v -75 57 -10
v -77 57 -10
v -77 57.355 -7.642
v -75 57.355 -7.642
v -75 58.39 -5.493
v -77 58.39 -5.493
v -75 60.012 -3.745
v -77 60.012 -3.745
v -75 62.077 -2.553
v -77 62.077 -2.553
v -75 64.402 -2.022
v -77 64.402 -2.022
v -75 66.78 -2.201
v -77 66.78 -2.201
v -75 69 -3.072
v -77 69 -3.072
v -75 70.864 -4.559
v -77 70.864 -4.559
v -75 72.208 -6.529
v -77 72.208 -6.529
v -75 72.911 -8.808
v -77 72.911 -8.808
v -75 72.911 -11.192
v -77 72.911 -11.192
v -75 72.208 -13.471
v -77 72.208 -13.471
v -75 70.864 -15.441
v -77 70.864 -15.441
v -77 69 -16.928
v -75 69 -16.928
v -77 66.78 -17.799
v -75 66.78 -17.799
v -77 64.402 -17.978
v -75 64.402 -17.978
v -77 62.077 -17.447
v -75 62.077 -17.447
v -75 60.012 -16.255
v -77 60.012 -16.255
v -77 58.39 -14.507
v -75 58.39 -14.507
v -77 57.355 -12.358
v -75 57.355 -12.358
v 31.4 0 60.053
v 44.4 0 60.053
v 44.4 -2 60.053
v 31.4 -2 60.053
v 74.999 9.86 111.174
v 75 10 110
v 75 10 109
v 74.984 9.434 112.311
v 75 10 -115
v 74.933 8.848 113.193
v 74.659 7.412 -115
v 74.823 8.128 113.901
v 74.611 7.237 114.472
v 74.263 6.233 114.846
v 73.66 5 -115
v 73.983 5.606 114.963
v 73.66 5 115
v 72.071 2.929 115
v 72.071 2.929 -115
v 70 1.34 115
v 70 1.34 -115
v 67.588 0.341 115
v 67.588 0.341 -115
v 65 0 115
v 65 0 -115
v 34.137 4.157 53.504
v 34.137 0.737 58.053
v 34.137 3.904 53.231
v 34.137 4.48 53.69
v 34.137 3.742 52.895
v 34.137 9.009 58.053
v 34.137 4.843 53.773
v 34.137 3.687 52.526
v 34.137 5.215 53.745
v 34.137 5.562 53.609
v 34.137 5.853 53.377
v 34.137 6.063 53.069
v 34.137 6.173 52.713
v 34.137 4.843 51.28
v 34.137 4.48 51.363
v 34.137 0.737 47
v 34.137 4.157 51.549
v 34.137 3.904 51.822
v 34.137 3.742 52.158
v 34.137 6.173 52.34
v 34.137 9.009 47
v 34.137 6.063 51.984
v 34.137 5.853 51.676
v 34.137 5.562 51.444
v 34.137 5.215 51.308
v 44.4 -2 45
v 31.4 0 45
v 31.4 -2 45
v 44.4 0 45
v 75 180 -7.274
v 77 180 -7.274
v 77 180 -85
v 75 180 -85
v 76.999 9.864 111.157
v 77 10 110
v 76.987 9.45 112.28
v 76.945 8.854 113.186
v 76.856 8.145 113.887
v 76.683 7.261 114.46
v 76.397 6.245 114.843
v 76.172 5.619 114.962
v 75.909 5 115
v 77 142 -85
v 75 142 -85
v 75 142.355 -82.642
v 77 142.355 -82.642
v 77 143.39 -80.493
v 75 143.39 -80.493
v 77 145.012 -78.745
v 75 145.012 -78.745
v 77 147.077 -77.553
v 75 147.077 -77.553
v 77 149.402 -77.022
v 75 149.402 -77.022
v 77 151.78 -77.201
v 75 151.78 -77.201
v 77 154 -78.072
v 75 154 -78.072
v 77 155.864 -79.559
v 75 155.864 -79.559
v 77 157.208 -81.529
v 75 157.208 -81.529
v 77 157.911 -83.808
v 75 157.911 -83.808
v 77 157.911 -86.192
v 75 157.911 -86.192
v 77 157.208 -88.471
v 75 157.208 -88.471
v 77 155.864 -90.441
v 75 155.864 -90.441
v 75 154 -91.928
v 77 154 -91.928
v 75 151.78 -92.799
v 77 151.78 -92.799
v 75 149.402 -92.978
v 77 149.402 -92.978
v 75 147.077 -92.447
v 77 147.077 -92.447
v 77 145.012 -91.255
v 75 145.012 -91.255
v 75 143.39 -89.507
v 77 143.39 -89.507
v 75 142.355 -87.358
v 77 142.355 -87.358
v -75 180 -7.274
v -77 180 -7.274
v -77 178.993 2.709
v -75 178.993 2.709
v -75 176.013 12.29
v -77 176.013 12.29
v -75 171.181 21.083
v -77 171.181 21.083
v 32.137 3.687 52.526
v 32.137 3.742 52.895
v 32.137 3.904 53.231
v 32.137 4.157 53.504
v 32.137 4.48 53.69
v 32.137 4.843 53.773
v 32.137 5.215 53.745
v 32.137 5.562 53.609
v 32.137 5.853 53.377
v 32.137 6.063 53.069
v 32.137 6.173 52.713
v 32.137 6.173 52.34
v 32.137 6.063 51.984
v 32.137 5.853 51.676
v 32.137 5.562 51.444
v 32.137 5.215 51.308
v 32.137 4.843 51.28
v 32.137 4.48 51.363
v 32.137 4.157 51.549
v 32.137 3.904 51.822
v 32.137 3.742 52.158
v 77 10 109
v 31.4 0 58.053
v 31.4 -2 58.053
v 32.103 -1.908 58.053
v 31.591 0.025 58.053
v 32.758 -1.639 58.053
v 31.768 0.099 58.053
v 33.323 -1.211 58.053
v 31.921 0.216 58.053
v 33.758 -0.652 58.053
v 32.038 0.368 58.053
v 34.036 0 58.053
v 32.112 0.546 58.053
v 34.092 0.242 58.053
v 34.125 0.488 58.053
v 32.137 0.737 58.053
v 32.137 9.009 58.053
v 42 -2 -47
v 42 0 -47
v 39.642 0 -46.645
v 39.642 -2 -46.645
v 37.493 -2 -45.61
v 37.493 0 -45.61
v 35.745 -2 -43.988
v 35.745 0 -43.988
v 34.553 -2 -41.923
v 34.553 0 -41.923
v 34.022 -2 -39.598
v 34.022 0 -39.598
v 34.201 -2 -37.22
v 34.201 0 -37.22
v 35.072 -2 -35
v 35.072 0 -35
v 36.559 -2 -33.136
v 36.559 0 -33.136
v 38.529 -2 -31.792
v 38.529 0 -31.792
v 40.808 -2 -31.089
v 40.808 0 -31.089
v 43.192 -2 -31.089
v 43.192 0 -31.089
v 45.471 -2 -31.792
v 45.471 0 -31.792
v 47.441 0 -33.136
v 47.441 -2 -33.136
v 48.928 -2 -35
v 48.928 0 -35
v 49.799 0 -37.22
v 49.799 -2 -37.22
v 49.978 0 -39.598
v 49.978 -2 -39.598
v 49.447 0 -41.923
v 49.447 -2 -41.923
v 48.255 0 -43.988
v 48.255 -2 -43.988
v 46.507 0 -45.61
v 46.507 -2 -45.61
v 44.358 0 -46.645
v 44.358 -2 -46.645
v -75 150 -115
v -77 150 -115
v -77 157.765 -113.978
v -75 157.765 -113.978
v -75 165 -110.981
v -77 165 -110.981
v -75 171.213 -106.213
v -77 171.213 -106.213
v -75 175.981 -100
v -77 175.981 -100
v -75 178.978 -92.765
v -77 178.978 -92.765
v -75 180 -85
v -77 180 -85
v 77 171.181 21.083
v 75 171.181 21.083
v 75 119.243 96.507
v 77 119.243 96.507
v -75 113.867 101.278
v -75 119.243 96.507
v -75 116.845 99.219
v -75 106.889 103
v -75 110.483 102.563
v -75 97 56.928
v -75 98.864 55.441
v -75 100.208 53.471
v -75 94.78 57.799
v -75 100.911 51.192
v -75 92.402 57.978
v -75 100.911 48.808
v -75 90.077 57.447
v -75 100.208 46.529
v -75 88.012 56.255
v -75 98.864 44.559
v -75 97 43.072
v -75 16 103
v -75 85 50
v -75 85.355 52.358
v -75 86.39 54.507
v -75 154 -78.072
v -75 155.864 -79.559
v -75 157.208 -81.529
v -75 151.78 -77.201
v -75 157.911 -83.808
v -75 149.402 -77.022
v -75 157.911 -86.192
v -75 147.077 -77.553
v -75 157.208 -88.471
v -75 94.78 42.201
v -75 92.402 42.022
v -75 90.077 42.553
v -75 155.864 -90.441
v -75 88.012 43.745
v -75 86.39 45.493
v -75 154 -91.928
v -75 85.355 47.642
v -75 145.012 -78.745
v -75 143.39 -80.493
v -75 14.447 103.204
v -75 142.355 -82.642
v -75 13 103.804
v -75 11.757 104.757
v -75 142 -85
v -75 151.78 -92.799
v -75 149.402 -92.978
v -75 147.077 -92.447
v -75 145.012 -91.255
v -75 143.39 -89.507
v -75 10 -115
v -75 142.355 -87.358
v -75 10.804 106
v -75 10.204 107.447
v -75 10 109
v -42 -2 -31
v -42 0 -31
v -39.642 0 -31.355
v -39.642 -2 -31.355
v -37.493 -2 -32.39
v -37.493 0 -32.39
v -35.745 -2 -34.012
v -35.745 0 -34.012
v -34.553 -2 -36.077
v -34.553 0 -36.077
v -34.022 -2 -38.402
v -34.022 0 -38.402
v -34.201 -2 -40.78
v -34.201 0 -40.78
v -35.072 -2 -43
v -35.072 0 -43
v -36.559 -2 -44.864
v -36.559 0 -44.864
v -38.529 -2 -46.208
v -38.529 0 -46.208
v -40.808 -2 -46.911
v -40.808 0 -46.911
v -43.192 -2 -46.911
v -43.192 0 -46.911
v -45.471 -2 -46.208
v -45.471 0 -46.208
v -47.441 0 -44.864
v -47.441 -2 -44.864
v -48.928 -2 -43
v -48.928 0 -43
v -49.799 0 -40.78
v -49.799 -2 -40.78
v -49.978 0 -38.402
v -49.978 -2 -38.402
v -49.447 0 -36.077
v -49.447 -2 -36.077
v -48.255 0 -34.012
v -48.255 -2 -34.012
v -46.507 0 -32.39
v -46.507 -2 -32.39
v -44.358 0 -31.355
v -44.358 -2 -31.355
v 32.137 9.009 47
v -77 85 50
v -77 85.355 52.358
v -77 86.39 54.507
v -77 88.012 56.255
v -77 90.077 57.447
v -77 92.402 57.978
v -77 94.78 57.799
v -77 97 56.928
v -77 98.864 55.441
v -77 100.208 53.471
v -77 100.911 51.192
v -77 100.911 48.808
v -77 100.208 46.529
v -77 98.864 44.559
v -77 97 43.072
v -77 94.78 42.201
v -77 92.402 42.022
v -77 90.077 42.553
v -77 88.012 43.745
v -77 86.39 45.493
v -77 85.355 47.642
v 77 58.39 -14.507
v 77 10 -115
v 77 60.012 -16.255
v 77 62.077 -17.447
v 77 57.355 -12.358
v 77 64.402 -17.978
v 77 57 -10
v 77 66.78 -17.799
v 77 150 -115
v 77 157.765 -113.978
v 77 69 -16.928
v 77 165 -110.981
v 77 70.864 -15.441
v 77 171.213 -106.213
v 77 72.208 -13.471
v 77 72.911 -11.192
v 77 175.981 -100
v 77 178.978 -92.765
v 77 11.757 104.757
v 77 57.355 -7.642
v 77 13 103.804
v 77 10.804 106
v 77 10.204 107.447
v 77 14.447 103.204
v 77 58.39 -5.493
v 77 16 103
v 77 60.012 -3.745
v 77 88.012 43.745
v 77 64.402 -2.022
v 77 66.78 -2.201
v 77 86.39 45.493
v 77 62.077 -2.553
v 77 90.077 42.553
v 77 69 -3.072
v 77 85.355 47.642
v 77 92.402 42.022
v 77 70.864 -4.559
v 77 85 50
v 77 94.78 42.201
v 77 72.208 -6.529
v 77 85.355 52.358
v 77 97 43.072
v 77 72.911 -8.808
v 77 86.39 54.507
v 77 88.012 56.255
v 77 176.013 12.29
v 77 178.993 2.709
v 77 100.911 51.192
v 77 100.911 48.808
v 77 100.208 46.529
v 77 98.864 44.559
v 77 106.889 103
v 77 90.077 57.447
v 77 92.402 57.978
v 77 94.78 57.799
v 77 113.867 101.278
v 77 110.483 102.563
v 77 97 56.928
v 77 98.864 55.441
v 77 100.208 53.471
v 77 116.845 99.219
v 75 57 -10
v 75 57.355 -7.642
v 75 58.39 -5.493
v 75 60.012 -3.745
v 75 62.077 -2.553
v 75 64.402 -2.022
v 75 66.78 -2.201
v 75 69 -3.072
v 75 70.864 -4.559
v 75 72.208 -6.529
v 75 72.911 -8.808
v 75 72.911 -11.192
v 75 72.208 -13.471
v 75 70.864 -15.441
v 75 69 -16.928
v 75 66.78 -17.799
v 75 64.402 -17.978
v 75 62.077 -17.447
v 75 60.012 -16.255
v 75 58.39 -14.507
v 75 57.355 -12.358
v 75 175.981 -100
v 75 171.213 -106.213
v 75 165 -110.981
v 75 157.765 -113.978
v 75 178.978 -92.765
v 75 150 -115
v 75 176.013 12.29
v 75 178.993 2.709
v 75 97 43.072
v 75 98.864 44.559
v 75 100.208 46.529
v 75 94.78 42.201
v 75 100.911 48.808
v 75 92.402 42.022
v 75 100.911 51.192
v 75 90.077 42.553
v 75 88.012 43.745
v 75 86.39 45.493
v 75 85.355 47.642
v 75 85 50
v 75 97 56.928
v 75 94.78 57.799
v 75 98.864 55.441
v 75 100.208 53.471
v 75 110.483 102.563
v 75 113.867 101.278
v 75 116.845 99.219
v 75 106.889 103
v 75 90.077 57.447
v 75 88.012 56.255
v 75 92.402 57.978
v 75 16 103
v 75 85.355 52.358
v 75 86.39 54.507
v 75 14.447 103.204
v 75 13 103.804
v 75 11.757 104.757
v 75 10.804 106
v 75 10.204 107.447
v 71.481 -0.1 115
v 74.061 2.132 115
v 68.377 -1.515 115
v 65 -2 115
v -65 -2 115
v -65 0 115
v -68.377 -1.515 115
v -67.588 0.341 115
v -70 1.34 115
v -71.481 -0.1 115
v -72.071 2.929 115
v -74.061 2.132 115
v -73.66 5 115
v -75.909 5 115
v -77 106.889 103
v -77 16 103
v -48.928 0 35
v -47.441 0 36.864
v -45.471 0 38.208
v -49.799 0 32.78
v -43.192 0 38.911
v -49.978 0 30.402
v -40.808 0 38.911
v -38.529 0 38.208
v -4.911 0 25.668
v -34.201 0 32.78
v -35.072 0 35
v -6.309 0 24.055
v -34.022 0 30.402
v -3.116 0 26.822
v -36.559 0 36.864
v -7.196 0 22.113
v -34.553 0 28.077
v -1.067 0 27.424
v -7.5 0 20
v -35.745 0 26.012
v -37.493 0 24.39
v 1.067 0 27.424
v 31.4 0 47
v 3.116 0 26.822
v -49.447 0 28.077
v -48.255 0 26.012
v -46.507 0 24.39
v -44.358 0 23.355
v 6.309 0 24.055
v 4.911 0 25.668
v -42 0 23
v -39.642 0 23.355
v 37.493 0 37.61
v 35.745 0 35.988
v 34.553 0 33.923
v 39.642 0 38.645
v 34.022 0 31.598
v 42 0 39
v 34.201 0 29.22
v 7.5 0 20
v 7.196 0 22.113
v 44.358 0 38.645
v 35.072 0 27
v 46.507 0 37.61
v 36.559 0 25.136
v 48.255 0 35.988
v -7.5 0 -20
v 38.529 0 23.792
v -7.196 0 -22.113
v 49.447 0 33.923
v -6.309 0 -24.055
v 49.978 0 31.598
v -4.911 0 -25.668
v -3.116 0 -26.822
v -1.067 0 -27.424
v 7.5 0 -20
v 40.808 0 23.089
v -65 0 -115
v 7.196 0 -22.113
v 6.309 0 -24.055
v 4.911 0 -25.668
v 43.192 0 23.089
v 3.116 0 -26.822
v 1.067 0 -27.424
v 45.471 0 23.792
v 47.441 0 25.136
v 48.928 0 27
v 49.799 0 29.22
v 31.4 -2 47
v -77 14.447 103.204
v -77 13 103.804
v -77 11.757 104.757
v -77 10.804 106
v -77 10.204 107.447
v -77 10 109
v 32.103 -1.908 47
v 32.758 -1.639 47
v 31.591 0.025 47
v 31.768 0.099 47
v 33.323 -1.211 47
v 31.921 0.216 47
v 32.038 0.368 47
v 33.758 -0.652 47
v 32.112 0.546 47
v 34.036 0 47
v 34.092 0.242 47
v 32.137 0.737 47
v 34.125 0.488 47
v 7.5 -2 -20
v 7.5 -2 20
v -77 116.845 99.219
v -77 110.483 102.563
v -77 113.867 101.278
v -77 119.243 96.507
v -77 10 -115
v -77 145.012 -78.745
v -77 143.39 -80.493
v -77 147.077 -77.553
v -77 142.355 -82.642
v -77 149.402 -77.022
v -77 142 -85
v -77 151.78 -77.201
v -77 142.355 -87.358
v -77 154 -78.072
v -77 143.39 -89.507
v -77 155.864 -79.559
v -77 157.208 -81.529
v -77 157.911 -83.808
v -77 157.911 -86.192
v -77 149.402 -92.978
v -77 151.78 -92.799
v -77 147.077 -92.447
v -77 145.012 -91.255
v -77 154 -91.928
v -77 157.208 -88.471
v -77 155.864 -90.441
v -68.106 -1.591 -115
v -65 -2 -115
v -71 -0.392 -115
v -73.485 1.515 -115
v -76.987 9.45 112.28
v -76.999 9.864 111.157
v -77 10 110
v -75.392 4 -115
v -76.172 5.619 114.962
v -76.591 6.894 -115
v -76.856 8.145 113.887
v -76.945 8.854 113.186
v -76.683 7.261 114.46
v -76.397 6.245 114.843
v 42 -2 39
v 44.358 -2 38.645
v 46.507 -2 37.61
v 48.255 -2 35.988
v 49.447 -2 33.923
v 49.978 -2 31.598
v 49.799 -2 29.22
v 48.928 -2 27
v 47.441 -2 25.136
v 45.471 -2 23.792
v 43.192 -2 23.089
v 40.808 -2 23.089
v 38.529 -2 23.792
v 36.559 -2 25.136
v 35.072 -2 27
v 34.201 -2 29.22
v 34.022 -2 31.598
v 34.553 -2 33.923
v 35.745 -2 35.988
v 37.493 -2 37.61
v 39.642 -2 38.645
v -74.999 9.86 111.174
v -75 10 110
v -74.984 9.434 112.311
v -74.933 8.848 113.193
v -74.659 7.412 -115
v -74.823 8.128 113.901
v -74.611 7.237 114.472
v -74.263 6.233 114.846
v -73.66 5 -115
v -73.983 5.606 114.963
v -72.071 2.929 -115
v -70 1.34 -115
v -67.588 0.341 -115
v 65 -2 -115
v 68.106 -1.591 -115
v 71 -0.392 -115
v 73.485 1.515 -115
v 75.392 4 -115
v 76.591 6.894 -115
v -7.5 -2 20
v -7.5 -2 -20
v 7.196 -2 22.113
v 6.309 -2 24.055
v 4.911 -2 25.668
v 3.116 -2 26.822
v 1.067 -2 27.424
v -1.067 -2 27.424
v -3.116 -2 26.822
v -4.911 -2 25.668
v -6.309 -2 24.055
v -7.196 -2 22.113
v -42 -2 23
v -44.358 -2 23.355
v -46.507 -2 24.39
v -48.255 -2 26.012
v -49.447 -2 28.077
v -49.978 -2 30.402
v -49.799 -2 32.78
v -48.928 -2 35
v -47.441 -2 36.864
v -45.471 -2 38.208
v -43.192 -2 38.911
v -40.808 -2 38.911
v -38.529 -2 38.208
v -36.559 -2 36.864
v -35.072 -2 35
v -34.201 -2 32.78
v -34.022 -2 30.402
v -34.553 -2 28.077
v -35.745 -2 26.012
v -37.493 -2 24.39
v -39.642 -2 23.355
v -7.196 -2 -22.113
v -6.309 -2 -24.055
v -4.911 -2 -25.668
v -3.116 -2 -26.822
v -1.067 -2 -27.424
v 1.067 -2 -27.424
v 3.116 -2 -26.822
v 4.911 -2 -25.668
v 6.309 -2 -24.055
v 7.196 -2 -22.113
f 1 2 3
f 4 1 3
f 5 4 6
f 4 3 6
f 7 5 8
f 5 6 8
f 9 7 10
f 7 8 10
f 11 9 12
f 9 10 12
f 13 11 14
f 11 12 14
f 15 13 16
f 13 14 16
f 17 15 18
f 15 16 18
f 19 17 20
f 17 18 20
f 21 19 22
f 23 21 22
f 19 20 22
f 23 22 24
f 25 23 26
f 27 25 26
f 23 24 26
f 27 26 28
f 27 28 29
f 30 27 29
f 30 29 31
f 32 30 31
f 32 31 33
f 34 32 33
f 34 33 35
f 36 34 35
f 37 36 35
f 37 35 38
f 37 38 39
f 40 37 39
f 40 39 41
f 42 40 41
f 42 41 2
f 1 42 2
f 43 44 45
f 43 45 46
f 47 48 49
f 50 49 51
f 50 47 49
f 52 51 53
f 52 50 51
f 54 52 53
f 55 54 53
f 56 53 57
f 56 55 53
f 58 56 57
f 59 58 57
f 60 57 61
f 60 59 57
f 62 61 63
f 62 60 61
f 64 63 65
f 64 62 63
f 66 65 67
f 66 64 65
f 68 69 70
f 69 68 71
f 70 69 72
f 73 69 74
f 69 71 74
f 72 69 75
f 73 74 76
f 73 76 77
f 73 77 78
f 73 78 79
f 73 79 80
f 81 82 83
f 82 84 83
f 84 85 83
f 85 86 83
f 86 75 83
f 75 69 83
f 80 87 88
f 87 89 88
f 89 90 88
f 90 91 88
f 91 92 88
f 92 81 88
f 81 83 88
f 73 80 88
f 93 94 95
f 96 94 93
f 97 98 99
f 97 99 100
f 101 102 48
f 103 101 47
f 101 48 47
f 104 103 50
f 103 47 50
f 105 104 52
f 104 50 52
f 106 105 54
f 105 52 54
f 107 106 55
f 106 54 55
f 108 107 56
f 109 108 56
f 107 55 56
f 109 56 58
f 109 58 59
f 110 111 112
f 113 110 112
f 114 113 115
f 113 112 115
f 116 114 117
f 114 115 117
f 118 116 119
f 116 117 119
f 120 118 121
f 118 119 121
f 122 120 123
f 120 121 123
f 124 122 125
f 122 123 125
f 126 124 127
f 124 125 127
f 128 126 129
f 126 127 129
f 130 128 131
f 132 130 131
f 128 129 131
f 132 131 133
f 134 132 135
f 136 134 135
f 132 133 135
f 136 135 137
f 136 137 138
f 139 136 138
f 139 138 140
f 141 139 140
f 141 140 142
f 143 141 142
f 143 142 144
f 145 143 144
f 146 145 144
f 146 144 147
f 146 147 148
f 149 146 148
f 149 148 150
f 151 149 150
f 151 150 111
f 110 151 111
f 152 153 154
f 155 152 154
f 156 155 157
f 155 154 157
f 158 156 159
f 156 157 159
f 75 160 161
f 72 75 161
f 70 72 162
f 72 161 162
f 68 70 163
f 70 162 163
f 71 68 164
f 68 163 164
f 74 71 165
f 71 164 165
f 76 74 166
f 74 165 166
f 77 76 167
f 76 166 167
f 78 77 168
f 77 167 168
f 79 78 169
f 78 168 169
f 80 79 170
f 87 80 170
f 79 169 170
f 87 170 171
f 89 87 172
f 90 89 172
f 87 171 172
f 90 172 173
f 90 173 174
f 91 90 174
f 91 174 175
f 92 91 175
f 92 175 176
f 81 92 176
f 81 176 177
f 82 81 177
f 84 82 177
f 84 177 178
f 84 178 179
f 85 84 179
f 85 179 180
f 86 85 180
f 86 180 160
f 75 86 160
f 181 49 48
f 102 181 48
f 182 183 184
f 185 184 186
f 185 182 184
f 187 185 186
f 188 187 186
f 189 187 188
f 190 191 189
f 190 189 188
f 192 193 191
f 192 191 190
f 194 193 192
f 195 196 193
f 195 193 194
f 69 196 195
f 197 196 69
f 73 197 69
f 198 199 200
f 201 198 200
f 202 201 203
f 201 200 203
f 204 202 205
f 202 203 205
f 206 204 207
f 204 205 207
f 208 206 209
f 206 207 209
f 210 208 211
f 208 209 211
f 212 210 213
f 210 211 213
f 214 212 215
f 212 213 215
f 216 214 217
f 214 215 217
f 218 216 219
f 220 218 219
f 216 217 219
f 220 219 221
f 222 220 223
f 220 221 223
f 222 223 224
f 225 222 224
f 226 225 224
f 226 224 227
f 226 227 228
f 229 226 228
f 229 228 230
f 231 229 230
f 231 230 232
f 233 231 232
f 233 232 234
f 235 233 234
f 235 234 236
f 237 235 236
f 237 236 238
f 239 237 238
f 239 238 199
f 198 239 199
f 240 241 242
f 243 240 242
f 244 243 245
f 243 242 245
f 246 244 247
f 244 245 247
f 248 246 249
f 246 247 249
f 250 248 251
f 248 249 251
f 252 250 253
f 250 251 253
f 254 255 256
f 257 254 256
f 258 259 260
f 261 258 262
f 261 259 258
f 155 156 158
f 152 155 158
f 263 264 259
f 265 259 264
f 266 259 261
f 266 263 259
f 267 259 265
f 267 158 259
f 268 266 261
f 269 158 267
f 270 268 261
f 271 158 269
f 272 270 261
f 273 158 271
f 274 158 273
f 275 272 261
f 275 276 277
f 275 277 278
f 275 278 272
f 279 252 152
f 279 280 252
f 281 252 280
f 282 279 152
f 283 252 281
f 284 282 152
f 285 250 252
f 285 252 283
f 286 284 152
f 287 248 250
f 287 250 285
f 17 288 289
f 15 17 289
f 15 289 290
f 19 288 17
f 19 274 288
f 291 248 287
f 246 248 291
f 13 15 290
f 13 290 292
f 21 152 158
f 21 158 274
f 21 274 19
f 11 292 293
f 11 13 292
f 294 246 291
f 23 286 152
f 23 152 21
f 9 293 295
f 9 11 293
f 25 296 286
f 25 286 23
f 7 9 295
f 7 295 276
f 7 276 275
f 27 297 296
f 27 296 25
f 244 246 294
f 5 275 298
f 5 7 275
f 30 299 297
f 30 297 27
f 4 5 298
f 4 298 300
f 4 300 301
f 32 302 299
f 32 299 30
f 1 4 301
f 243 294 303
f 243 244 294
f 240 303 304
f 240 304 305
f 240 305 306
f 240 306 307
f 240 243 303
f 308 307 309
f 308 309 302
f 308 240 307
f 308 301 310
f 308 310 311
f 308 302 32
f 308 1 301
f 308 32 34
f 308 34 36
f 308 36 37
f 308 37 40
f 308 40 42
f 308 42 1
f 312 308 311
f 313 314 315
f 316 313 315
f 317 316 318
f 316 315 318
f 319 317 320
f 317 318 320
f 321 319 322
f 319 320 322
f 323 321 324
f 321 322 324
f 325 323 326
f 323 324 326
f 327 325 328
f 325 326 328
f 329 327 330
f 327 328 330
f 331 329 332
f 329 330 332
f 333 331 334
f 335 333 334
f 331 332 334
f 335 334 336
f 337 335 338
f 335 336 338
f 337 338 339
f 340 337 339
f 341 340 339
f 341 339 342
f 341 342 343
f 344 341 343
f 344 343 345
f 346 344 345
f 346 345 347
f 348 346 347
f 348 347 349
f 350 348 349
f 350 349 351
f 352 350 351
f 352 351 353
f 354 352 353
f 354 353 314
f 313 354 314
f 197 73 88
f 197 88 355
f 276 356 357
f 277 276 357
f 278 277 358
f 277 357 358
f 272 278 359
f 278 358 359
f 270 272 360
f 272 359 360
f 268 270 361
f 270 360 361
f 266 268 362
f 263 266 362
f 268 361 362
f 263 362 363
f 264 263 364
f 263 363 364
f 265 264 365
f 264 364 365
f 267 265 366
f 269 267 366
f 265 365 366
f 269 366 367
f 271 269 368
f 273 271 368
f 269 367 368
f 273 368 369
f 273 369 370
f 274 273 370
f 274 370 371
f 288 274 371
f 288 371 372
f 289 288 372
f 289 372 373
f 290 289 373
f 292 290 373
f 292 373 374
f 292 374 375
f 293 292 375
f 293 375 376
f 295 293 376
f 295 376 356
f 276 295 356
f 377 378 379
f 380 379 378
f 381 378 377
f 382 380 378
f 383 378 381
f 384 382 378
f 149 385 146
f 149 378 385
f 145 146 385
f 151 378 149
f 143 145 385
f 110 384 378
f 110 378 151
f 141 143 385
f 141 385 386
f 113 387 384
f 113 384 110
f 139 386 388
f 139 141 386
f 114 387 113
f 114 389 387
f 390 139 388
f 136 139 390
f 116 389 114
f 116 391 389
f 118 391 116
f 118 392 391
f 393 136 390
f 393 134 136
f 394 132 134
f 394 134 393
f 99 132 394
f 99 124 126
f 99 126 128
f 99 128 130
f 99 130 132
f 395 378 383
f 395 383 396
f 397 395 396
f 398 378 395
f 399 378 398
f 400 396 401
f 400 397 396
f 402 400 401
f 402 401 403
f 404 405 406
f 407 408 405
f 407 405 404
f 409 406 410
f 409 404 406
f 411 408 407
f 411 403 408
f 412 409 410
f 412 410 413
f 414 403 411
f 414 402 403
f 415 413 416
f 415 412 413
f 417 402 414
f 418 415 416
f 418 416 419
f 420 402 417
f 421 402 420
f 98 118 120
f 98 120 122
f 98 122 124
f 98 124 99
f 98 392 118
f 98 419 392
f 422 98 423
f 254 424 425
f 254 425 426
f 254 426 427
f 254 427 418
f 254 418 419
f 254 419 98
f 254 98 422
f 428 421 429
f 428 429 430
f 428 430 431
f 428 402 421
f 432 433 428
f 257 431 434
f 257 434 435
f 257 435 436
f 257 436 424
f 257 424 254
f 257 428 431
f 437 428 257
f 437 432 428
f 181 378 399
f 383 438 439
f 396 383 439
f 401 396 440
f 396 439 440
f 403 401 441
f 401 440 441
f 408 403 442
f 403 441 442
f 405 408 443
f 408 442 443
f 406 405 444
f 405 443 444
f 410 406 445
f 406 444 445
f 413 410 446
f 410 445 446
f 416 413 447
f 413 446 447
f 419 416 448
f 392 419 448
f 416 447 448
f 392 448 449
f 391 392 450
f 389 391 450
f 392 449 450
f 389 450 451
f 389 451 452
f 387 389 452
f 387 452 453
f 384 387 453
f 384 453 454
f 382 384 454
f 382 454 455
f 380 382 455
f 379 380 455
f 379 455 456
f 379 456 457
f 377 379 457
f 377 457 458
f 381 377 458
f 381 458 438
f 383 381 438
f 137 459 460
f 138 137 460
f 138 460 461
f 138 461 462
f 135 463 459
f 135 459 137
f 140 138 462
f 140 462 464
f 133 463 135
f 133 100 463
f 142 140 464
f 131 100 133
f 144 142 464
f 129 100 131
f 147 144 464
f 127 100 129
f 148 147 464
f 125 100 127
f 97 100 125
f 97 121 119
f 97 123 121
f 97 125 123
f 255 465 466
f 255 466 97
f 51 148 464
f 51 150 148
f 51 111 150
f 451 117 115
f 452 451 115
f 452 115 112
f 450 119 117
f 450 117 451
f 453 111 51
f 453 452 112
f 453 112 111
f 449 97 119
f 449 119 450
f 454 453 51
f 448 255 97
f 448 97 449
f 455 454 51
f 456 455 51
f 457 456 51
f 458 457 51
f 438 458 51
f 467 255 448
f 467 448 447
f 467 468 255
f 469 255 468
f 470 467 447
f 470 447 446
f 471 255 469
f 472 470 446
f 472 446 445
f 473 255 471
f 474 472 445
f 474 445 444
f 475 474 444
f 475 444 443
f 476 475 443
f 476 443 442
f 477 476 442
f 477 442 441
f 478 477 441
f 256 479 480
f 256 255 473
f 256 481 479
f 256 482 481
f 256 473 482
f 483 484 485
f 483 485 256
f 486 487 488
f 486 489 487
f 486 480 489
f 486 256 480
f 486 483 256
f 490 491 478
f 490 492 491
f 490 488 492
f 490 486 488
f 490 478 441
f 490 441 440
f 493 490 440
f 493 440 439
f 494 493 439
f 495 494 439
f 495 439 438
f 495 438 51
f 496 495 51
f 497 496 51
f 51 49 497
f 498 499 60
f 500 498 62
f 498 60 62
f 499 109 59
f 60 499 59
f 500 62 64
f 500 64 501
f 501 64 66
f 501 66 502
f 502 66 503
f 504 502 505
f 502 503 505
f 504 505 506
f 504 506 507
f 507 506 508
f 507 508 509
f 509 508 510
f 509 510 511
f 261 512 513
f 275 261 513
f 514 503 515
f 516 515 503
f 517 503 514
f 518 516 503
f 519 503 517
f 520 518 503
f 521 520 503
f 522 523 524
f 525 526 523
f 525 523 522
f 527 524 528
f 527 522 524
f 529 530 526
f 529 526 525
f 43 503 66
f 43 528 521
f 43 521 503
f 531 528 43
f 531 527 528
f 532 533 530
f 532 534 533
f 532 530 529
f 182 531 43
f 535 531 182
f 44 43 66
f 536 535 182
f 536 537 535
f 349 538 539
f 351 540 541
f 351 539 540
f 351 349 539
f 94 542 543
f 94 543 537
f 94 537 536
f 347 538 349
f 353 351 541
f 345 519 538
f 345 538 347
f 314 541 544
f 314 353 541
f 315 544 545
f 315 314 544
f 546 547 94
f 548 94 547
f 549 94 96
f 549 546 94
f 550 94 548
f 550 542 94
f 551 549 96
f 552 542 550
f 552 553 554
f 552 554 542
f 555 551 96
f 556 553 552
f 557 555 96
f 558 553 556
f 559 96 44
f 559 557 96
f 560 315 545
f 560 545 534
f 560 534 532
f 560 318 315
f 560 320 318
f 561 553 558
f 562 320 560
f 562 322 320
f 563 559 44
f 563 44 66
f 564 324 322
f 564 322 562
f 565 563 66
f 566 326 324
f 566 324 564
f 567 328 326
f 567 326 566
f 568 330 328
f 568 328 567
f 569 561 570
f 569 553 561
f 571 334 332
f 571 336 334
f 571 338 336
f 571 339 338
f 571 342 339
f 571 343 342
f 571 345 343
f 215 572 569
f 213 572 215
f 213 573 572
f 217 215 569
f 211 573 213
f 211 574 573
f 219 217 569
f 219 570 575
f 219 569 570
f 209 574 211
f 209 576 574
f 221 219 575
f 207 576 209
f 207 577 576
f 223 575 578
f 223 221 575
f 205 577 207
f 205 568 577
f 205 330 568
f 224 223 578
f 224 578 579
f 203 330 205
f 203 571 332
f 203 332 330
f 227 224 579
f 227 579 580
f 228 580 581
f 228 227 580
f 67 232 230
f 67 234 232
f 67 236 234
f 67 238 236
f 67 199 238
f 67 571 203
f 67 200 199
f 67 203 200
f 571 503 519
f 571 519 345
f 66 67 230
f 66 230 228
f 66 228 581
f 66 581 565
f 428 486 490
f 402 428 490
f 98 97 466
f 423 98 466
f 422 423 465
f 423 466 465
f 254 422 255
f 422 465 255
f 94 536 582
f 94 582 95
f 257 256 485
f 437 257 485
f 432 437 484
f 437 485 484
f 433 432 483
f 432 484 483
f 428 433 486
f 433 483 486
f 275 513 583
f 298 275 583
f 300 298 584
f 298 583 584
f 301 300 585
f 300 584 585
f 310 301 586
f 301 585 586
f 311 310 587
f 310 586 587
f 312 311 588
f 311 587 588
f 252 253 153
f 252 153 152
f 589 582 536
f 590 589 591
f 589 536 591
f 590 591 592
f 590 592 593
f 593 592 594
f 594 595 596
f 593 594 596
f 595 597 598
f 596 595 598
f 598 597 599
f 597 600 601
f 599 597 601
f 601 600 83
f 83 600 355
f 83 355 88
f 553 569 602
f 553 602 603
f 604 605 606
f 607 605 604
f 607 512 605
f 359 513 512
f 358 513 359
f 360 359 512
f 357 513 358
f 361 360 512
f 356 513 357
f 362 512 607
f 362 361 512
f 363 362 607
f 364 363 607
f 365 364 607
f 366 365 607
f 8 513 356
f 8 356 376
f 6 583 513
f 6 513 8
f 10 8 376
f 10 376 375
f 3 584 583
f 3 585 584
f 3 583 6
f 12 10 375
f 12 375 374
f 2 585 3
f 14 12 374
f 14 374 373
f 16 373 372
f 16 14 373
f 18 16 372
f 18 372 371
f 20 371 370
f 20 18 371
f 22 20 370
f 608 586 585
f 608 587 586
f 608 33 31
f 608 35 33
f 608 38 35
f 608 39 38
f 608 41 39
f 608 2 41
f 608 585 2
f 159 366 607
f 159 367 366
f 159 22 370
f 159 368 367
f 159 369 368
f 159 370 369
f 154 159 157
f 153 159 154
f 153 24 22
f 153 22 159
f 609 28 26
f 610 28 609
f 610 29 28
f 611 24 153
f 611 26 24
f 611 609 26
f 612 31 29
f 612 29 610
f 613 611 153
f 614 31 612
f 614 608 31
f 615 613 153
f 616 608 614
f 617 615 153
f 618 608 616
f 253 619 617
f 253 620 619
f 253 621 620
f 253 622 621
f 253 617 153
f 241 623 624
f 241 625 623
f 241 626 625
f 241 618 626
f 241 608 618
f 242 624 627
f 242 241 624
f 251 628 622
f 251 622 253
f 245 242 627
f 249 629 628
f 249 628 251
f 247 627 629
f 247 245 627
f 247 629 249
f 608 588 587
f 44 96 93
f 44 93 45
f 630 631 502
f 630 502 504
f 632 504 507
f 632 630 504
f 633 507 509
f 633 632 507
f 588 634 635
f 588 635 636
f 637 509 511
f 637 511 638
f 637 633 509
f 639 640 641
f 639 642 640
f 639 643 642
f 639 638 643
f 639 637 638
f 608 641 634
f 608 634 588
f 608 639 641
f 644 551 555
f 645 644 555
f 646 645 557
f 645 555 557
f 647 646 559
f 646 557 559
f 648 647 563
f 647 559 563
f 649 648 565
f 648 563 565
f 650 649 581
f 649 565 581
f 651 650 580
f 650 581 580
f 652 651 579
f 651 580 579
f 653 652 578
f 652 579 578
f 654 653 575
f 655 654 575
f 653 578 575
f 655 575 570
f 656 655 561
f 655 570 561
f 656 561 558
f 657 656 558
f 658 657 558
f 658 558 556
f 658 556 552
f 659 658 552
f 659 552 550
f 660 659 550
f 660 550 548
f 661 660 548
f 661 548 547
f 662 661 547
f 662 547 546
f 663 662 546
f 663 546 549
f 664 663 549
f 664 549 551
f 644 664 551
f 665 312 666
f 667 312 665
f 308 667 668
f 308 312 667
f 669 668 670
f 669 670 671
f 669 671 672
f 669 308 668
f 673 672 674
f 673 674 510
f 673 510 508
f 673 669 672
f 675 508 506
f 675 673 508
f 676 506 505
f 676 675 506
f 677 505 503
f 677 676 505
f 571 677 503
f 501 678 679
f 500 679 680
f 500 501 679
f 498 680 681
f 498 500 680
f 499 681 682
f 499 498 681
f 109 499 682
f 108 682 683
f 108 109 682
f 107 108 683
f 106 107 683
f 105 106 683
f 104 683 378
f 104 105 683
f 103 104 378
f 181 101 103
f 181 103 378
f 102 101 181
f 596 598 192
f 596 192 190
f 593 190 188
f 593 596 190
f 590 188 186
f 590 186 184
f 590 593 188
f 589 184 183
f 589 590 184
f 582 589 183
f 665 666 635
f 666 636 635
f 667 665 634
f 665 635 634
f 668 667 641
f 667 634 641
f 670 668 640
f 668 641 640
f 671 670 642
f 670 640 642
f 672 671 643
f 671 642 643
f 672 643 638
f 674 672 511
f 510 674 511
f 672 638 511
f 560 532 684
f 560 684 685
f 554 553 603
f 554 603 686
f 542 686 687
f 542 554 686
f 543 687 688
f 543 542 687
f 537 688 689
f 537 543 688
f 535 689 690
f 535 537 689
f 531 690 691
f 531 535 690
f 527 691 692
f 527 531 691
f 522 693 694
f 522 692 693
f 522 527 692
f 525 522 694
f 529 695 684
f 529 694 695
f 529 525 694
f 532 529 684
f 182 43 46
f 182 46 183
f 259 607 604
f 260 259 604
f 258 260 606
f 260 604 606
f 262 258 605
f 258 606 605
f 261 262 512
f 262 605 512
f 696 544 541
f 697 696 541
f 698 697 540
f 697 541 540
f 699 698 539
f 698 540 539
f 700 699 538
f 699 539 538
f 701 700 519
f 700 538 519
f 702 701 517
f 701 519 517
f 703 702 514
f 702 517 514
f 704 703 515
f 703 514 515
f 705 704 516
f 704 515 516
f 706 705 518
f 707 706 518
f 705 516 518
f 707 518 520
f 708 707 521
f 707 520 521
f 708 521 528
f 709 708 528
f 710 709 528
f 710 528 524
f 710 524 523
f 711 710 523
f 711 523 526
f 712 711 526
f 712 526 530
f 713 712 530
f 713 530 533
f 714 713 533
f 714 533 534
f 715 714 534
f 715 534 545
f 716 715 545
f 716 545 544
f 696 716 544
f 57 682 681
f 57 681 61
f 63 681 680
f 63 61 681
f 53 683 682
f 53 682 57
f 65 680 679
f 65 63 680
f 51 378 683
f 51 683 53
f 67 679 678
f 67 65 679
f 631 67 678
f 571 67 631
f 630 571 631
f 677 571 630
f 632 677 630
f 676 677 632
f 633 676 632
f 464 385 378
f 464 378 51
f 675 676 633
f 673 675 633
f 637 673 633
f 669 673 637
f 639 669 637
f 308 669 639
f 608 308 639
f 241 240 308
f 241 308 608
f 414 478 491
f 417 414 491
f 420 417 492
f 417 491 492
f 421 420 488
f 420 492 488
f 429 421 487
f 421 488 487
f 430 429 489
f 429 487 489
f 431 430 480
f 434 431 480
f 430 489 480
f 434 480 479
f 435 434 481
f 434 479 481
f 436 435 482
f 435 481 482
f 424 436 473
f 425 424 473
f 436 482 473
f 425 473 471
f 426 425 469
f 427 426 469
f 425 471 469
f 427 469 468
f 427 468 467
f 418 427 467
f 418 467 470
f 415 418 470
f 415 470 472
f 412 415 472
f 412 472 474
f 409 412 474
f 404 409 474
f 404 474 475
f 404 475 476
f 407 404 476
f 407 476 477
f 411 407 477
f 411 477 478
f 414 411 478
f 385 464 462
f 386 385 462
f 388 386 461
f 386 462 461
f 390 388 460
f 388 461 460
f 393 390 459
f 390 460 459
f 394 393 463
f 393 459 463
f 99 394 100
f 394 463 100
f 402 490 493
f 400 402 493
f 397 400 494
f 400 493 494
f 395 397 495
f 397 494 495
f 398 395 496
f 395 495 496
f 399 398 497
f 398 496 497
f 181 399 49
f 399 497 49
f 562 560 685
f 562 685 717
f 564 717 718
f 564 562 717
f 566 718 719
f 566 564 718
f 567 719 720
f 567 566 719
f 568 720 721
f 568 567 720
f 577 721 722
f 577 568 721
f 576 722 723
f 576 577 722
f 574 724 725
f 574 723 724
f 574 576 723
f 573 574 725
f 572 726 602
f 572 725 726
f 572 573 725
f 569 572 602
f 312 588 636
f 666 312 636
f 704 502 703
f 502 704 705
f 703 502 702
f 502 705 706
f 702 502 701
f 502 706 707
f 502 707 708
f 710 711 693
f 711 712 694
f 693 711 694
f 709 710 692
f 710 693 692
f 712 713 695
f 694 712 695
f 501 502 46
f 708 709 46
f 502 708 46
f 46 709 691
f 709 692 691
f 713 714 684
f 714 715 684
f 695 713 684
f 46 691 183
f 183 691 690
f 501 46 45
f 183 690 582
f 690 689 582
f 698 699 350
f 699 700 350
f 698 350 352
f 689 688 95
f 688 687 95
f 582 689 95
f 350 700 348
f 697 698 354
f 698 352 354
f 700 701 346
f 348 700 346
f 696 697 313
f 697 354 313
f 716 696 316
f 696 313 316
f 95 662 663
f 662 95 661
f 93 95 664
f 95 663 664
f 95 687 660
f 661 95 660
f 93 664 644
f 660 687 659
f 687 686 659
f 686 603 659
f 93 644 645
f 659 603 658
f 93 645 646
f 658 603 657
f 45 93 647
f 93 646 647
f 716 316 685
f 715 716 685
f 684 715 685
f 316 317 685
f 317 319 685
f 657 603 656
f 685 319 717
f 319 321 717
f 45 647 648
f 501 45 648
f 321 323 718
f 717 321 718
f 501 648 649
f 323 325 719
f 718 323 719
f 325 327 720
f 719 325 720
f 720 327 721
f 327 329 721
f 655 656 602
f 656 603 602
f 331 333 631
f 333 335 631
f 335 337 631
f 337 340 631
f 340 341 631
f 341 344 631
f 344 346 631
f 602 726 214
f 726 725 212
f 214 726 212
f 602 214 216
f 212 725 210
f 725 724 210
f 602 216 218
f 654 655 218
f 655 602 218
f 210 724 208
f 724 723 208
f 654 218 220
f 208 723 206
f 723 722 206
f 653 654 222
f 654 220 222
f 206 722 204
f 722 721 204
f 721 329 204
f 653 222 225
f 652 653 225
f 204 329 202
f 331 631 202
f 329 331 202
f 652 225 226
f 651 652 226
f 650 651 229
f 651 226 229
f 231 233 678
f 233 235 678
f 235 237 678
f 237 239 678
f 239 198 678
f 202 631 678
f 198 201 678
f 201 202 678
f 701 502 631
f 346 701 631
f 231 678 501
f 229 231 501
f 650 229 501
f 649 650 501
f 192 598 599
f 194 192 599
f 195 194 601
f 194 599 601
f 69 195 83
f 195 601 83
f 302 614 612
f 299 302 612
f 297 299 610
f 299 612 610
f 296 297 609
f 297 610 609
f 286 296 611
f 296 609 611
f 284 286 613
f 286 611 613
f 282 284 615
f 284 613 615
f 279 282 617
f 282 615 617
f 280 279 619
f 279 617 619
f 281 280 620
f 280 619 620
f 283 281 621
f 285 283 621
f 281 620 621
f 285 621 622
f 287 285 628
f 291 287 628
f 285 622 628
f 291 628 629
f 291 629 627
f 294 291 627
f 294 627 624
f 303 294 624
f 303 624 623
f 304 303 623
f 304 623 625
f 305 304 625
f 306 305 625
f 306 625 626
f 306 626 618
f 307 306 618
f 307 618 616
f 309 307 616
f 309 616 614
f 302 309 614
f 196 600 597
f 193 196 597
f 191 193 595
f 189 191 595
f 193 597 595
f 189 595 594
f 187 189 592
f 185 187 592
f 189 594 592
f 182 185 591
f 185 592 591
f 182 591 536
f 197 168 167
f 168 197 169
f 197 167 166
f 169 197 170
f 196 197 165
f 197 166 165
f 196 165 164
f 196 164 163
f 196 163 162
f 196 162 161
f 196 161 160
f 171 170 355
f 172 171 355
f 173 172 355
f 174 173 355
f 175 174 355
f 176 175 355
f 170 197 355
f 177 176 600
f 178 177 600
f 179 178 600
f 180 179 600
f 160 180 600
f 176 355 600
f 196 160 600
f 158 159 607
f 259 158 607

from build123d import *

# Parameters (mm, degrees)
SKETCH1_W                      = 150
SKETCH1_H                      = 230
BASE_FLANGE1_DEPTH             = 2
EDGE_FLANGE1_STRIP_W           = 28
EDGE_FLANGE1_STRIP_H           = 2
EDGE_FLANGE1_STRIP_CUT_DEPTH   = 230
EDGE_FLANGE1_STRIP_2_W         = 28
EDGE_FLANGE1_STRIP_2_H         = 2
EDGE_FLANGE1_STRIP_CUT_2_DEPTH = 230
EDGE_FLANGE1_DEPTH             = 230
EDGE_FLANGE1_BEND_DEPTH        = 230
SKETCH15_OUTSIDE_W             = 298.254
SKETCH15_OUTSIDE_H             = 250.254
SKETCH15_OUTSIDE_R             = 8
CUT_EXTRUDE1_DEPTH             = 264.326793168
SKETCH16_R                     = 8
CUT_EXTRUDE2_DEPTH             = 228.055059487
CUT_EXTRUDE3_DEPTH             = 228.055059487
SKETCHED_START                 = 47
SKETCHED_BEND1_DEPTH           = 11.052994728
SKETCHED_BEND1_2_DEPTH         = 11.052994728
CUT_EXTRUDE4_REACH             = 241.866
SKETCH20_R                     = 1.25


# Read off the part's stored shape, not the designer's step: Sketched Bend1
# Sheet-metal steps are written as plain solids
with BuildPart() as part:
    # Sketch1 → Base-Flange1 (new body)
    with BuildSketch(Plane(origin=(0, 0, 0), x_dir=(1, 0, 0), z_dir=(0, 1, 0))):
        Rectangle(SKETCH1_W, SKETCH1_H)
    extrude(amount=-BASE_FLANGE1_DEPTH)

    # Edge-Flange1 strip (across the edge) → Edge-Flange1 strip cut (cut)
    with BuildSketch(Plane(origin=(75, 0, 115), x_dir=(-1, 0, 0), z_dir=(0, 0, -1))):
        with Locations((-4, -1)):
            Rectangle(EDGE_FLANGE1_STRIP_W, EDGE_FLANGE1_STRIP_H)
    extrude(amount=EDGE_FLANGE1_STRIP_CUT_DEPTH, mode=Mode.SUBTRACT)

    # Edge-Flange1 strip 2 (across the edge) → Edge-Flange1 strip cut 2 (cut)
    with BuildSketch(Plane(origin=(-75, 0, -115), x_dir=(1, 0, 0), z_dir=(0, 0, 1))):
        with Locations((-4, -1)):
            Rectangle(EDGE_FLANGE1_STRIP_2_W, EDGE_FLANGE1_STRIP_2_H)
    extrude(amount=EDGE_FLANGE1_STRIP_CUT_2_DEPTH, mode=Mode.SUBTRACT)

    # Edge-Flange1 section (across the edge) → Edge-Flange1 (add)
    with BuildSketch(Plane(origin=(75, 0, 115), x_dir=(-1, 0, 0), z_dir=(0, 0, -1))):
        with BuildLine():
            Line((-2, 10), (-2, 180))
            Line((-2, 180), (0, 180))
            Line((0, 180), (0, 10))
            ThreePointArc((0, 10), (2.928932188, 2.928932188), (10, 0))
            Line((10, 0), (10, -2))
            ThreePointArc((10, -2), (1.514718626, 1.514718626), (-2, 10))
        make_face()
    extrude(amount=EDGE_FLANGE1_DEPTH)

    # Edge-Flange1 section 2 (across the edge) → Edge-Flange1 bend (add)
    with BuildSketch(Plane(origin=(-75, 0, -115), x_dir=(1, 0, 0), z_dir=(0, 0, 1))):
        with BuildLine():
            Line((-2, 10), (-2, 180))
            Line((-2, 180), (0, 180))
            Line((0, 180), (0, 10))
            ThreePointArc((0, 10), (2.928932188, 2.928932188), (10, 0))
            Line((10, 0), (10, -2))
            ThreePointArc((10, -2), (1.514718626, 1.514718626), (-2, 10))
        make_face()
    extrude(amount=EDGE_FLANGE1_BEND_DEPTH)

    # Sketch15 outside → Cut-Extrude1 (cut, through all)
    # profile 1 of 4: a face of its own
    with BuildSketch(Plane.ZY.offset(77)):
        with Locations((0, 89)):
            Rectangle(SKETCH15_OUTSIDE_W, SKETCH15_OUTSIDE_H)
        with BuildLine():
            Line((21.083470393, 171.180744276), (96.507242037, 119.243178795))
            ThreePointArc((96.507242037, 119.243178795), (101.277963521, 113.867184852), (103, 106.888955512))
            Line((103, 106.888955512), (103, 16))
            ThreePointArc((103, 16), (104.757359313, 11.757359313), (109, 10))
            Line((109, 10), (110, 10))
            ThreePointArc((110, 10), (113.535533906, 8.535533906), (115, 5))
            Line((115, 5), (115, -2))
            Line((115, -2), (-115, -2))
            Line((-115, -2), (-115, 99))
            Line((-115, 99), (-115, 150))
            ThreePointArc((-115, 150), (-106.213203436, 171.213203436), (-85, 180))
            Line((-85, 180), (-7.274003064, 180))
            ThreePointArc((-7.274003064, 180), (7.574612801, 177.744304445), (21.083470393, 171.180744276))
        make_face(mode=Mode.SUBTRACT)
    # profile 2 of 4: a face of its own
    with BuildSketch(Plane.ZY.offset(77)):
        with Locations(Location((50, 93, 0), (0, 0, 270))):
            Circle(SKETCH15_OUTSIDE_R)
    # profile 3 of 4: a face of its own
    with BuildSketch(Plane.ZY.offset(77)):
        with Locations(Location((-85, 150, 0), (0, 0, 270))):
            Circle(SKETCH15_OUTSIDE_R)
    # profile 4 of 4: a face of its own
    with BuildSketch(Plane.ZY.offset(77)):
        with Locations(Location((-10, 65, 0), (0, 0, 270))):
            Circle(SKETCH15_OUTSIDE_R)
    extrude(amount=-CUT_EXTRUDE1_DEPTH, mode=Mode.SUBTRACT)

    # Sketch16 → Cut-Extrude2 (cut, through all)
    with BuildSketch(Plane(origin=(0, 0, 0), x_dir=(1, 0, 0), z_dir=(0, 1, 0))):
        with Locations(Location((-42, 39, 0), (0, 0, 270))):
            Circle(SKETCH16_R)
        with Locations(Location((42, 39, 0), (0, 0, 90))):
            Circle(SKETCH16_R)
        with Locations(Location((-42, -31, 0), (0, 0, 90))):
            Circle(SKETCH16_R)
        with Locations(Location((42, -31, 0), (0, 0, 270))):
            Circle(SKETCH16_R)
        with BuildLine():
            Line((7.5, 20), (7.5, -20))
            ThreePointArc((7.5, -20), (0, -27.5), (-7.5, -20))
            Line((-7.5, -20), (-7.5, 20))
            ThreePointArc((-7.5, 20), (0, 27.5), (7.5, 20))
        make_face()
    extrude(amount=-CUT_EXTRUDE2_DEPTH, mode=Mode.SUBTRACT)

    # Sketch18 → Cut-Extrude3 (cut, through all)
    with BuildSketch(Plane(origin=(0, 0, 0), x_dir=(1, 0, 0), z_dir=(0, 1, 0))):
        Polygon((31.4, -45), (44.4, -45), (44.4, -60.052994728), (31.4, -60.052994728), (31.4, -58.052994728), (42.4, -58.052994728), (42.4, -47), (31.4, -47), align=None)
    extrude(amount=-CUT_EXTRUDE3_DEPTH, mode=Mode.SUBTRACT)

    # Sketched Bend1 outline → Sketched Bend1 (cut)
    with BuildSketch(Plane.XY.offset(SKETCHED_START)):
        with BuildLine():
            ThreePointArc((34.035602398, 0), (33.054267209, -1.443395312), (31.4, -2))
            Line((31.4, -2), (42.4, -2))
            Line((42.4, -2), (42.4, 0))
            Line((42.4, 0), (34.035602398, 0))
        make_face()
    extrude(amount=SKETCHED_BEND1_DEPTH, mode=Mode.SUBTRACT)

    # Sketched Bend1 2 outline → Sketched Bend1 2 (add)
    with BuildSketch(Plane.XY.offset(SKETCHED_START)):
        with BuildLine():
            Line((31.4, 0), (34.035602398, 0))
            ThreePointArc((34.035602398, 0), (34.111233029, 0.364854094), (34.1366, 0.7366))
            Line((34.1366, 0.7366), (34.1366, 9.008755099))
            Line((34.1366, 9.008755099), (32.1366, 9.008755099))
            Line((32.1366, 9.008755099), (32.1366, 0.7366))
            ThreePointArc((32.1366, 0.7366), (31.920854855, 0.215745145), (31.4, 0))
        make_face()
    extrude(amount=SKETCHED_BEND1_2_DEPTH)

    # Sketch20 → Cut-Extrude4 (cut, up to next)
    with BuildSketch(Plane.ZY.offset(-32.1366), mode=Mode.PRIVATE) as cut_extrude4_sk1:
        with Locations(Location((52.526497364, 4.9366, 0), (0, 0, 270))):
            Circle(SKETCH20_R)
    cut_extrude4_tool1 = extrude(cut_extrude4_sk1.sketch, amount=-CUT_EXTRUDE4_REACH, mode=Mode.PRIVATE) & part.part
    add(cut_extrude4_tool1.solids().sort_by_distance((32.1366, 4.9366, 52.526497))[0], mode=Mode.SUBTRACT)


solid = part.part
